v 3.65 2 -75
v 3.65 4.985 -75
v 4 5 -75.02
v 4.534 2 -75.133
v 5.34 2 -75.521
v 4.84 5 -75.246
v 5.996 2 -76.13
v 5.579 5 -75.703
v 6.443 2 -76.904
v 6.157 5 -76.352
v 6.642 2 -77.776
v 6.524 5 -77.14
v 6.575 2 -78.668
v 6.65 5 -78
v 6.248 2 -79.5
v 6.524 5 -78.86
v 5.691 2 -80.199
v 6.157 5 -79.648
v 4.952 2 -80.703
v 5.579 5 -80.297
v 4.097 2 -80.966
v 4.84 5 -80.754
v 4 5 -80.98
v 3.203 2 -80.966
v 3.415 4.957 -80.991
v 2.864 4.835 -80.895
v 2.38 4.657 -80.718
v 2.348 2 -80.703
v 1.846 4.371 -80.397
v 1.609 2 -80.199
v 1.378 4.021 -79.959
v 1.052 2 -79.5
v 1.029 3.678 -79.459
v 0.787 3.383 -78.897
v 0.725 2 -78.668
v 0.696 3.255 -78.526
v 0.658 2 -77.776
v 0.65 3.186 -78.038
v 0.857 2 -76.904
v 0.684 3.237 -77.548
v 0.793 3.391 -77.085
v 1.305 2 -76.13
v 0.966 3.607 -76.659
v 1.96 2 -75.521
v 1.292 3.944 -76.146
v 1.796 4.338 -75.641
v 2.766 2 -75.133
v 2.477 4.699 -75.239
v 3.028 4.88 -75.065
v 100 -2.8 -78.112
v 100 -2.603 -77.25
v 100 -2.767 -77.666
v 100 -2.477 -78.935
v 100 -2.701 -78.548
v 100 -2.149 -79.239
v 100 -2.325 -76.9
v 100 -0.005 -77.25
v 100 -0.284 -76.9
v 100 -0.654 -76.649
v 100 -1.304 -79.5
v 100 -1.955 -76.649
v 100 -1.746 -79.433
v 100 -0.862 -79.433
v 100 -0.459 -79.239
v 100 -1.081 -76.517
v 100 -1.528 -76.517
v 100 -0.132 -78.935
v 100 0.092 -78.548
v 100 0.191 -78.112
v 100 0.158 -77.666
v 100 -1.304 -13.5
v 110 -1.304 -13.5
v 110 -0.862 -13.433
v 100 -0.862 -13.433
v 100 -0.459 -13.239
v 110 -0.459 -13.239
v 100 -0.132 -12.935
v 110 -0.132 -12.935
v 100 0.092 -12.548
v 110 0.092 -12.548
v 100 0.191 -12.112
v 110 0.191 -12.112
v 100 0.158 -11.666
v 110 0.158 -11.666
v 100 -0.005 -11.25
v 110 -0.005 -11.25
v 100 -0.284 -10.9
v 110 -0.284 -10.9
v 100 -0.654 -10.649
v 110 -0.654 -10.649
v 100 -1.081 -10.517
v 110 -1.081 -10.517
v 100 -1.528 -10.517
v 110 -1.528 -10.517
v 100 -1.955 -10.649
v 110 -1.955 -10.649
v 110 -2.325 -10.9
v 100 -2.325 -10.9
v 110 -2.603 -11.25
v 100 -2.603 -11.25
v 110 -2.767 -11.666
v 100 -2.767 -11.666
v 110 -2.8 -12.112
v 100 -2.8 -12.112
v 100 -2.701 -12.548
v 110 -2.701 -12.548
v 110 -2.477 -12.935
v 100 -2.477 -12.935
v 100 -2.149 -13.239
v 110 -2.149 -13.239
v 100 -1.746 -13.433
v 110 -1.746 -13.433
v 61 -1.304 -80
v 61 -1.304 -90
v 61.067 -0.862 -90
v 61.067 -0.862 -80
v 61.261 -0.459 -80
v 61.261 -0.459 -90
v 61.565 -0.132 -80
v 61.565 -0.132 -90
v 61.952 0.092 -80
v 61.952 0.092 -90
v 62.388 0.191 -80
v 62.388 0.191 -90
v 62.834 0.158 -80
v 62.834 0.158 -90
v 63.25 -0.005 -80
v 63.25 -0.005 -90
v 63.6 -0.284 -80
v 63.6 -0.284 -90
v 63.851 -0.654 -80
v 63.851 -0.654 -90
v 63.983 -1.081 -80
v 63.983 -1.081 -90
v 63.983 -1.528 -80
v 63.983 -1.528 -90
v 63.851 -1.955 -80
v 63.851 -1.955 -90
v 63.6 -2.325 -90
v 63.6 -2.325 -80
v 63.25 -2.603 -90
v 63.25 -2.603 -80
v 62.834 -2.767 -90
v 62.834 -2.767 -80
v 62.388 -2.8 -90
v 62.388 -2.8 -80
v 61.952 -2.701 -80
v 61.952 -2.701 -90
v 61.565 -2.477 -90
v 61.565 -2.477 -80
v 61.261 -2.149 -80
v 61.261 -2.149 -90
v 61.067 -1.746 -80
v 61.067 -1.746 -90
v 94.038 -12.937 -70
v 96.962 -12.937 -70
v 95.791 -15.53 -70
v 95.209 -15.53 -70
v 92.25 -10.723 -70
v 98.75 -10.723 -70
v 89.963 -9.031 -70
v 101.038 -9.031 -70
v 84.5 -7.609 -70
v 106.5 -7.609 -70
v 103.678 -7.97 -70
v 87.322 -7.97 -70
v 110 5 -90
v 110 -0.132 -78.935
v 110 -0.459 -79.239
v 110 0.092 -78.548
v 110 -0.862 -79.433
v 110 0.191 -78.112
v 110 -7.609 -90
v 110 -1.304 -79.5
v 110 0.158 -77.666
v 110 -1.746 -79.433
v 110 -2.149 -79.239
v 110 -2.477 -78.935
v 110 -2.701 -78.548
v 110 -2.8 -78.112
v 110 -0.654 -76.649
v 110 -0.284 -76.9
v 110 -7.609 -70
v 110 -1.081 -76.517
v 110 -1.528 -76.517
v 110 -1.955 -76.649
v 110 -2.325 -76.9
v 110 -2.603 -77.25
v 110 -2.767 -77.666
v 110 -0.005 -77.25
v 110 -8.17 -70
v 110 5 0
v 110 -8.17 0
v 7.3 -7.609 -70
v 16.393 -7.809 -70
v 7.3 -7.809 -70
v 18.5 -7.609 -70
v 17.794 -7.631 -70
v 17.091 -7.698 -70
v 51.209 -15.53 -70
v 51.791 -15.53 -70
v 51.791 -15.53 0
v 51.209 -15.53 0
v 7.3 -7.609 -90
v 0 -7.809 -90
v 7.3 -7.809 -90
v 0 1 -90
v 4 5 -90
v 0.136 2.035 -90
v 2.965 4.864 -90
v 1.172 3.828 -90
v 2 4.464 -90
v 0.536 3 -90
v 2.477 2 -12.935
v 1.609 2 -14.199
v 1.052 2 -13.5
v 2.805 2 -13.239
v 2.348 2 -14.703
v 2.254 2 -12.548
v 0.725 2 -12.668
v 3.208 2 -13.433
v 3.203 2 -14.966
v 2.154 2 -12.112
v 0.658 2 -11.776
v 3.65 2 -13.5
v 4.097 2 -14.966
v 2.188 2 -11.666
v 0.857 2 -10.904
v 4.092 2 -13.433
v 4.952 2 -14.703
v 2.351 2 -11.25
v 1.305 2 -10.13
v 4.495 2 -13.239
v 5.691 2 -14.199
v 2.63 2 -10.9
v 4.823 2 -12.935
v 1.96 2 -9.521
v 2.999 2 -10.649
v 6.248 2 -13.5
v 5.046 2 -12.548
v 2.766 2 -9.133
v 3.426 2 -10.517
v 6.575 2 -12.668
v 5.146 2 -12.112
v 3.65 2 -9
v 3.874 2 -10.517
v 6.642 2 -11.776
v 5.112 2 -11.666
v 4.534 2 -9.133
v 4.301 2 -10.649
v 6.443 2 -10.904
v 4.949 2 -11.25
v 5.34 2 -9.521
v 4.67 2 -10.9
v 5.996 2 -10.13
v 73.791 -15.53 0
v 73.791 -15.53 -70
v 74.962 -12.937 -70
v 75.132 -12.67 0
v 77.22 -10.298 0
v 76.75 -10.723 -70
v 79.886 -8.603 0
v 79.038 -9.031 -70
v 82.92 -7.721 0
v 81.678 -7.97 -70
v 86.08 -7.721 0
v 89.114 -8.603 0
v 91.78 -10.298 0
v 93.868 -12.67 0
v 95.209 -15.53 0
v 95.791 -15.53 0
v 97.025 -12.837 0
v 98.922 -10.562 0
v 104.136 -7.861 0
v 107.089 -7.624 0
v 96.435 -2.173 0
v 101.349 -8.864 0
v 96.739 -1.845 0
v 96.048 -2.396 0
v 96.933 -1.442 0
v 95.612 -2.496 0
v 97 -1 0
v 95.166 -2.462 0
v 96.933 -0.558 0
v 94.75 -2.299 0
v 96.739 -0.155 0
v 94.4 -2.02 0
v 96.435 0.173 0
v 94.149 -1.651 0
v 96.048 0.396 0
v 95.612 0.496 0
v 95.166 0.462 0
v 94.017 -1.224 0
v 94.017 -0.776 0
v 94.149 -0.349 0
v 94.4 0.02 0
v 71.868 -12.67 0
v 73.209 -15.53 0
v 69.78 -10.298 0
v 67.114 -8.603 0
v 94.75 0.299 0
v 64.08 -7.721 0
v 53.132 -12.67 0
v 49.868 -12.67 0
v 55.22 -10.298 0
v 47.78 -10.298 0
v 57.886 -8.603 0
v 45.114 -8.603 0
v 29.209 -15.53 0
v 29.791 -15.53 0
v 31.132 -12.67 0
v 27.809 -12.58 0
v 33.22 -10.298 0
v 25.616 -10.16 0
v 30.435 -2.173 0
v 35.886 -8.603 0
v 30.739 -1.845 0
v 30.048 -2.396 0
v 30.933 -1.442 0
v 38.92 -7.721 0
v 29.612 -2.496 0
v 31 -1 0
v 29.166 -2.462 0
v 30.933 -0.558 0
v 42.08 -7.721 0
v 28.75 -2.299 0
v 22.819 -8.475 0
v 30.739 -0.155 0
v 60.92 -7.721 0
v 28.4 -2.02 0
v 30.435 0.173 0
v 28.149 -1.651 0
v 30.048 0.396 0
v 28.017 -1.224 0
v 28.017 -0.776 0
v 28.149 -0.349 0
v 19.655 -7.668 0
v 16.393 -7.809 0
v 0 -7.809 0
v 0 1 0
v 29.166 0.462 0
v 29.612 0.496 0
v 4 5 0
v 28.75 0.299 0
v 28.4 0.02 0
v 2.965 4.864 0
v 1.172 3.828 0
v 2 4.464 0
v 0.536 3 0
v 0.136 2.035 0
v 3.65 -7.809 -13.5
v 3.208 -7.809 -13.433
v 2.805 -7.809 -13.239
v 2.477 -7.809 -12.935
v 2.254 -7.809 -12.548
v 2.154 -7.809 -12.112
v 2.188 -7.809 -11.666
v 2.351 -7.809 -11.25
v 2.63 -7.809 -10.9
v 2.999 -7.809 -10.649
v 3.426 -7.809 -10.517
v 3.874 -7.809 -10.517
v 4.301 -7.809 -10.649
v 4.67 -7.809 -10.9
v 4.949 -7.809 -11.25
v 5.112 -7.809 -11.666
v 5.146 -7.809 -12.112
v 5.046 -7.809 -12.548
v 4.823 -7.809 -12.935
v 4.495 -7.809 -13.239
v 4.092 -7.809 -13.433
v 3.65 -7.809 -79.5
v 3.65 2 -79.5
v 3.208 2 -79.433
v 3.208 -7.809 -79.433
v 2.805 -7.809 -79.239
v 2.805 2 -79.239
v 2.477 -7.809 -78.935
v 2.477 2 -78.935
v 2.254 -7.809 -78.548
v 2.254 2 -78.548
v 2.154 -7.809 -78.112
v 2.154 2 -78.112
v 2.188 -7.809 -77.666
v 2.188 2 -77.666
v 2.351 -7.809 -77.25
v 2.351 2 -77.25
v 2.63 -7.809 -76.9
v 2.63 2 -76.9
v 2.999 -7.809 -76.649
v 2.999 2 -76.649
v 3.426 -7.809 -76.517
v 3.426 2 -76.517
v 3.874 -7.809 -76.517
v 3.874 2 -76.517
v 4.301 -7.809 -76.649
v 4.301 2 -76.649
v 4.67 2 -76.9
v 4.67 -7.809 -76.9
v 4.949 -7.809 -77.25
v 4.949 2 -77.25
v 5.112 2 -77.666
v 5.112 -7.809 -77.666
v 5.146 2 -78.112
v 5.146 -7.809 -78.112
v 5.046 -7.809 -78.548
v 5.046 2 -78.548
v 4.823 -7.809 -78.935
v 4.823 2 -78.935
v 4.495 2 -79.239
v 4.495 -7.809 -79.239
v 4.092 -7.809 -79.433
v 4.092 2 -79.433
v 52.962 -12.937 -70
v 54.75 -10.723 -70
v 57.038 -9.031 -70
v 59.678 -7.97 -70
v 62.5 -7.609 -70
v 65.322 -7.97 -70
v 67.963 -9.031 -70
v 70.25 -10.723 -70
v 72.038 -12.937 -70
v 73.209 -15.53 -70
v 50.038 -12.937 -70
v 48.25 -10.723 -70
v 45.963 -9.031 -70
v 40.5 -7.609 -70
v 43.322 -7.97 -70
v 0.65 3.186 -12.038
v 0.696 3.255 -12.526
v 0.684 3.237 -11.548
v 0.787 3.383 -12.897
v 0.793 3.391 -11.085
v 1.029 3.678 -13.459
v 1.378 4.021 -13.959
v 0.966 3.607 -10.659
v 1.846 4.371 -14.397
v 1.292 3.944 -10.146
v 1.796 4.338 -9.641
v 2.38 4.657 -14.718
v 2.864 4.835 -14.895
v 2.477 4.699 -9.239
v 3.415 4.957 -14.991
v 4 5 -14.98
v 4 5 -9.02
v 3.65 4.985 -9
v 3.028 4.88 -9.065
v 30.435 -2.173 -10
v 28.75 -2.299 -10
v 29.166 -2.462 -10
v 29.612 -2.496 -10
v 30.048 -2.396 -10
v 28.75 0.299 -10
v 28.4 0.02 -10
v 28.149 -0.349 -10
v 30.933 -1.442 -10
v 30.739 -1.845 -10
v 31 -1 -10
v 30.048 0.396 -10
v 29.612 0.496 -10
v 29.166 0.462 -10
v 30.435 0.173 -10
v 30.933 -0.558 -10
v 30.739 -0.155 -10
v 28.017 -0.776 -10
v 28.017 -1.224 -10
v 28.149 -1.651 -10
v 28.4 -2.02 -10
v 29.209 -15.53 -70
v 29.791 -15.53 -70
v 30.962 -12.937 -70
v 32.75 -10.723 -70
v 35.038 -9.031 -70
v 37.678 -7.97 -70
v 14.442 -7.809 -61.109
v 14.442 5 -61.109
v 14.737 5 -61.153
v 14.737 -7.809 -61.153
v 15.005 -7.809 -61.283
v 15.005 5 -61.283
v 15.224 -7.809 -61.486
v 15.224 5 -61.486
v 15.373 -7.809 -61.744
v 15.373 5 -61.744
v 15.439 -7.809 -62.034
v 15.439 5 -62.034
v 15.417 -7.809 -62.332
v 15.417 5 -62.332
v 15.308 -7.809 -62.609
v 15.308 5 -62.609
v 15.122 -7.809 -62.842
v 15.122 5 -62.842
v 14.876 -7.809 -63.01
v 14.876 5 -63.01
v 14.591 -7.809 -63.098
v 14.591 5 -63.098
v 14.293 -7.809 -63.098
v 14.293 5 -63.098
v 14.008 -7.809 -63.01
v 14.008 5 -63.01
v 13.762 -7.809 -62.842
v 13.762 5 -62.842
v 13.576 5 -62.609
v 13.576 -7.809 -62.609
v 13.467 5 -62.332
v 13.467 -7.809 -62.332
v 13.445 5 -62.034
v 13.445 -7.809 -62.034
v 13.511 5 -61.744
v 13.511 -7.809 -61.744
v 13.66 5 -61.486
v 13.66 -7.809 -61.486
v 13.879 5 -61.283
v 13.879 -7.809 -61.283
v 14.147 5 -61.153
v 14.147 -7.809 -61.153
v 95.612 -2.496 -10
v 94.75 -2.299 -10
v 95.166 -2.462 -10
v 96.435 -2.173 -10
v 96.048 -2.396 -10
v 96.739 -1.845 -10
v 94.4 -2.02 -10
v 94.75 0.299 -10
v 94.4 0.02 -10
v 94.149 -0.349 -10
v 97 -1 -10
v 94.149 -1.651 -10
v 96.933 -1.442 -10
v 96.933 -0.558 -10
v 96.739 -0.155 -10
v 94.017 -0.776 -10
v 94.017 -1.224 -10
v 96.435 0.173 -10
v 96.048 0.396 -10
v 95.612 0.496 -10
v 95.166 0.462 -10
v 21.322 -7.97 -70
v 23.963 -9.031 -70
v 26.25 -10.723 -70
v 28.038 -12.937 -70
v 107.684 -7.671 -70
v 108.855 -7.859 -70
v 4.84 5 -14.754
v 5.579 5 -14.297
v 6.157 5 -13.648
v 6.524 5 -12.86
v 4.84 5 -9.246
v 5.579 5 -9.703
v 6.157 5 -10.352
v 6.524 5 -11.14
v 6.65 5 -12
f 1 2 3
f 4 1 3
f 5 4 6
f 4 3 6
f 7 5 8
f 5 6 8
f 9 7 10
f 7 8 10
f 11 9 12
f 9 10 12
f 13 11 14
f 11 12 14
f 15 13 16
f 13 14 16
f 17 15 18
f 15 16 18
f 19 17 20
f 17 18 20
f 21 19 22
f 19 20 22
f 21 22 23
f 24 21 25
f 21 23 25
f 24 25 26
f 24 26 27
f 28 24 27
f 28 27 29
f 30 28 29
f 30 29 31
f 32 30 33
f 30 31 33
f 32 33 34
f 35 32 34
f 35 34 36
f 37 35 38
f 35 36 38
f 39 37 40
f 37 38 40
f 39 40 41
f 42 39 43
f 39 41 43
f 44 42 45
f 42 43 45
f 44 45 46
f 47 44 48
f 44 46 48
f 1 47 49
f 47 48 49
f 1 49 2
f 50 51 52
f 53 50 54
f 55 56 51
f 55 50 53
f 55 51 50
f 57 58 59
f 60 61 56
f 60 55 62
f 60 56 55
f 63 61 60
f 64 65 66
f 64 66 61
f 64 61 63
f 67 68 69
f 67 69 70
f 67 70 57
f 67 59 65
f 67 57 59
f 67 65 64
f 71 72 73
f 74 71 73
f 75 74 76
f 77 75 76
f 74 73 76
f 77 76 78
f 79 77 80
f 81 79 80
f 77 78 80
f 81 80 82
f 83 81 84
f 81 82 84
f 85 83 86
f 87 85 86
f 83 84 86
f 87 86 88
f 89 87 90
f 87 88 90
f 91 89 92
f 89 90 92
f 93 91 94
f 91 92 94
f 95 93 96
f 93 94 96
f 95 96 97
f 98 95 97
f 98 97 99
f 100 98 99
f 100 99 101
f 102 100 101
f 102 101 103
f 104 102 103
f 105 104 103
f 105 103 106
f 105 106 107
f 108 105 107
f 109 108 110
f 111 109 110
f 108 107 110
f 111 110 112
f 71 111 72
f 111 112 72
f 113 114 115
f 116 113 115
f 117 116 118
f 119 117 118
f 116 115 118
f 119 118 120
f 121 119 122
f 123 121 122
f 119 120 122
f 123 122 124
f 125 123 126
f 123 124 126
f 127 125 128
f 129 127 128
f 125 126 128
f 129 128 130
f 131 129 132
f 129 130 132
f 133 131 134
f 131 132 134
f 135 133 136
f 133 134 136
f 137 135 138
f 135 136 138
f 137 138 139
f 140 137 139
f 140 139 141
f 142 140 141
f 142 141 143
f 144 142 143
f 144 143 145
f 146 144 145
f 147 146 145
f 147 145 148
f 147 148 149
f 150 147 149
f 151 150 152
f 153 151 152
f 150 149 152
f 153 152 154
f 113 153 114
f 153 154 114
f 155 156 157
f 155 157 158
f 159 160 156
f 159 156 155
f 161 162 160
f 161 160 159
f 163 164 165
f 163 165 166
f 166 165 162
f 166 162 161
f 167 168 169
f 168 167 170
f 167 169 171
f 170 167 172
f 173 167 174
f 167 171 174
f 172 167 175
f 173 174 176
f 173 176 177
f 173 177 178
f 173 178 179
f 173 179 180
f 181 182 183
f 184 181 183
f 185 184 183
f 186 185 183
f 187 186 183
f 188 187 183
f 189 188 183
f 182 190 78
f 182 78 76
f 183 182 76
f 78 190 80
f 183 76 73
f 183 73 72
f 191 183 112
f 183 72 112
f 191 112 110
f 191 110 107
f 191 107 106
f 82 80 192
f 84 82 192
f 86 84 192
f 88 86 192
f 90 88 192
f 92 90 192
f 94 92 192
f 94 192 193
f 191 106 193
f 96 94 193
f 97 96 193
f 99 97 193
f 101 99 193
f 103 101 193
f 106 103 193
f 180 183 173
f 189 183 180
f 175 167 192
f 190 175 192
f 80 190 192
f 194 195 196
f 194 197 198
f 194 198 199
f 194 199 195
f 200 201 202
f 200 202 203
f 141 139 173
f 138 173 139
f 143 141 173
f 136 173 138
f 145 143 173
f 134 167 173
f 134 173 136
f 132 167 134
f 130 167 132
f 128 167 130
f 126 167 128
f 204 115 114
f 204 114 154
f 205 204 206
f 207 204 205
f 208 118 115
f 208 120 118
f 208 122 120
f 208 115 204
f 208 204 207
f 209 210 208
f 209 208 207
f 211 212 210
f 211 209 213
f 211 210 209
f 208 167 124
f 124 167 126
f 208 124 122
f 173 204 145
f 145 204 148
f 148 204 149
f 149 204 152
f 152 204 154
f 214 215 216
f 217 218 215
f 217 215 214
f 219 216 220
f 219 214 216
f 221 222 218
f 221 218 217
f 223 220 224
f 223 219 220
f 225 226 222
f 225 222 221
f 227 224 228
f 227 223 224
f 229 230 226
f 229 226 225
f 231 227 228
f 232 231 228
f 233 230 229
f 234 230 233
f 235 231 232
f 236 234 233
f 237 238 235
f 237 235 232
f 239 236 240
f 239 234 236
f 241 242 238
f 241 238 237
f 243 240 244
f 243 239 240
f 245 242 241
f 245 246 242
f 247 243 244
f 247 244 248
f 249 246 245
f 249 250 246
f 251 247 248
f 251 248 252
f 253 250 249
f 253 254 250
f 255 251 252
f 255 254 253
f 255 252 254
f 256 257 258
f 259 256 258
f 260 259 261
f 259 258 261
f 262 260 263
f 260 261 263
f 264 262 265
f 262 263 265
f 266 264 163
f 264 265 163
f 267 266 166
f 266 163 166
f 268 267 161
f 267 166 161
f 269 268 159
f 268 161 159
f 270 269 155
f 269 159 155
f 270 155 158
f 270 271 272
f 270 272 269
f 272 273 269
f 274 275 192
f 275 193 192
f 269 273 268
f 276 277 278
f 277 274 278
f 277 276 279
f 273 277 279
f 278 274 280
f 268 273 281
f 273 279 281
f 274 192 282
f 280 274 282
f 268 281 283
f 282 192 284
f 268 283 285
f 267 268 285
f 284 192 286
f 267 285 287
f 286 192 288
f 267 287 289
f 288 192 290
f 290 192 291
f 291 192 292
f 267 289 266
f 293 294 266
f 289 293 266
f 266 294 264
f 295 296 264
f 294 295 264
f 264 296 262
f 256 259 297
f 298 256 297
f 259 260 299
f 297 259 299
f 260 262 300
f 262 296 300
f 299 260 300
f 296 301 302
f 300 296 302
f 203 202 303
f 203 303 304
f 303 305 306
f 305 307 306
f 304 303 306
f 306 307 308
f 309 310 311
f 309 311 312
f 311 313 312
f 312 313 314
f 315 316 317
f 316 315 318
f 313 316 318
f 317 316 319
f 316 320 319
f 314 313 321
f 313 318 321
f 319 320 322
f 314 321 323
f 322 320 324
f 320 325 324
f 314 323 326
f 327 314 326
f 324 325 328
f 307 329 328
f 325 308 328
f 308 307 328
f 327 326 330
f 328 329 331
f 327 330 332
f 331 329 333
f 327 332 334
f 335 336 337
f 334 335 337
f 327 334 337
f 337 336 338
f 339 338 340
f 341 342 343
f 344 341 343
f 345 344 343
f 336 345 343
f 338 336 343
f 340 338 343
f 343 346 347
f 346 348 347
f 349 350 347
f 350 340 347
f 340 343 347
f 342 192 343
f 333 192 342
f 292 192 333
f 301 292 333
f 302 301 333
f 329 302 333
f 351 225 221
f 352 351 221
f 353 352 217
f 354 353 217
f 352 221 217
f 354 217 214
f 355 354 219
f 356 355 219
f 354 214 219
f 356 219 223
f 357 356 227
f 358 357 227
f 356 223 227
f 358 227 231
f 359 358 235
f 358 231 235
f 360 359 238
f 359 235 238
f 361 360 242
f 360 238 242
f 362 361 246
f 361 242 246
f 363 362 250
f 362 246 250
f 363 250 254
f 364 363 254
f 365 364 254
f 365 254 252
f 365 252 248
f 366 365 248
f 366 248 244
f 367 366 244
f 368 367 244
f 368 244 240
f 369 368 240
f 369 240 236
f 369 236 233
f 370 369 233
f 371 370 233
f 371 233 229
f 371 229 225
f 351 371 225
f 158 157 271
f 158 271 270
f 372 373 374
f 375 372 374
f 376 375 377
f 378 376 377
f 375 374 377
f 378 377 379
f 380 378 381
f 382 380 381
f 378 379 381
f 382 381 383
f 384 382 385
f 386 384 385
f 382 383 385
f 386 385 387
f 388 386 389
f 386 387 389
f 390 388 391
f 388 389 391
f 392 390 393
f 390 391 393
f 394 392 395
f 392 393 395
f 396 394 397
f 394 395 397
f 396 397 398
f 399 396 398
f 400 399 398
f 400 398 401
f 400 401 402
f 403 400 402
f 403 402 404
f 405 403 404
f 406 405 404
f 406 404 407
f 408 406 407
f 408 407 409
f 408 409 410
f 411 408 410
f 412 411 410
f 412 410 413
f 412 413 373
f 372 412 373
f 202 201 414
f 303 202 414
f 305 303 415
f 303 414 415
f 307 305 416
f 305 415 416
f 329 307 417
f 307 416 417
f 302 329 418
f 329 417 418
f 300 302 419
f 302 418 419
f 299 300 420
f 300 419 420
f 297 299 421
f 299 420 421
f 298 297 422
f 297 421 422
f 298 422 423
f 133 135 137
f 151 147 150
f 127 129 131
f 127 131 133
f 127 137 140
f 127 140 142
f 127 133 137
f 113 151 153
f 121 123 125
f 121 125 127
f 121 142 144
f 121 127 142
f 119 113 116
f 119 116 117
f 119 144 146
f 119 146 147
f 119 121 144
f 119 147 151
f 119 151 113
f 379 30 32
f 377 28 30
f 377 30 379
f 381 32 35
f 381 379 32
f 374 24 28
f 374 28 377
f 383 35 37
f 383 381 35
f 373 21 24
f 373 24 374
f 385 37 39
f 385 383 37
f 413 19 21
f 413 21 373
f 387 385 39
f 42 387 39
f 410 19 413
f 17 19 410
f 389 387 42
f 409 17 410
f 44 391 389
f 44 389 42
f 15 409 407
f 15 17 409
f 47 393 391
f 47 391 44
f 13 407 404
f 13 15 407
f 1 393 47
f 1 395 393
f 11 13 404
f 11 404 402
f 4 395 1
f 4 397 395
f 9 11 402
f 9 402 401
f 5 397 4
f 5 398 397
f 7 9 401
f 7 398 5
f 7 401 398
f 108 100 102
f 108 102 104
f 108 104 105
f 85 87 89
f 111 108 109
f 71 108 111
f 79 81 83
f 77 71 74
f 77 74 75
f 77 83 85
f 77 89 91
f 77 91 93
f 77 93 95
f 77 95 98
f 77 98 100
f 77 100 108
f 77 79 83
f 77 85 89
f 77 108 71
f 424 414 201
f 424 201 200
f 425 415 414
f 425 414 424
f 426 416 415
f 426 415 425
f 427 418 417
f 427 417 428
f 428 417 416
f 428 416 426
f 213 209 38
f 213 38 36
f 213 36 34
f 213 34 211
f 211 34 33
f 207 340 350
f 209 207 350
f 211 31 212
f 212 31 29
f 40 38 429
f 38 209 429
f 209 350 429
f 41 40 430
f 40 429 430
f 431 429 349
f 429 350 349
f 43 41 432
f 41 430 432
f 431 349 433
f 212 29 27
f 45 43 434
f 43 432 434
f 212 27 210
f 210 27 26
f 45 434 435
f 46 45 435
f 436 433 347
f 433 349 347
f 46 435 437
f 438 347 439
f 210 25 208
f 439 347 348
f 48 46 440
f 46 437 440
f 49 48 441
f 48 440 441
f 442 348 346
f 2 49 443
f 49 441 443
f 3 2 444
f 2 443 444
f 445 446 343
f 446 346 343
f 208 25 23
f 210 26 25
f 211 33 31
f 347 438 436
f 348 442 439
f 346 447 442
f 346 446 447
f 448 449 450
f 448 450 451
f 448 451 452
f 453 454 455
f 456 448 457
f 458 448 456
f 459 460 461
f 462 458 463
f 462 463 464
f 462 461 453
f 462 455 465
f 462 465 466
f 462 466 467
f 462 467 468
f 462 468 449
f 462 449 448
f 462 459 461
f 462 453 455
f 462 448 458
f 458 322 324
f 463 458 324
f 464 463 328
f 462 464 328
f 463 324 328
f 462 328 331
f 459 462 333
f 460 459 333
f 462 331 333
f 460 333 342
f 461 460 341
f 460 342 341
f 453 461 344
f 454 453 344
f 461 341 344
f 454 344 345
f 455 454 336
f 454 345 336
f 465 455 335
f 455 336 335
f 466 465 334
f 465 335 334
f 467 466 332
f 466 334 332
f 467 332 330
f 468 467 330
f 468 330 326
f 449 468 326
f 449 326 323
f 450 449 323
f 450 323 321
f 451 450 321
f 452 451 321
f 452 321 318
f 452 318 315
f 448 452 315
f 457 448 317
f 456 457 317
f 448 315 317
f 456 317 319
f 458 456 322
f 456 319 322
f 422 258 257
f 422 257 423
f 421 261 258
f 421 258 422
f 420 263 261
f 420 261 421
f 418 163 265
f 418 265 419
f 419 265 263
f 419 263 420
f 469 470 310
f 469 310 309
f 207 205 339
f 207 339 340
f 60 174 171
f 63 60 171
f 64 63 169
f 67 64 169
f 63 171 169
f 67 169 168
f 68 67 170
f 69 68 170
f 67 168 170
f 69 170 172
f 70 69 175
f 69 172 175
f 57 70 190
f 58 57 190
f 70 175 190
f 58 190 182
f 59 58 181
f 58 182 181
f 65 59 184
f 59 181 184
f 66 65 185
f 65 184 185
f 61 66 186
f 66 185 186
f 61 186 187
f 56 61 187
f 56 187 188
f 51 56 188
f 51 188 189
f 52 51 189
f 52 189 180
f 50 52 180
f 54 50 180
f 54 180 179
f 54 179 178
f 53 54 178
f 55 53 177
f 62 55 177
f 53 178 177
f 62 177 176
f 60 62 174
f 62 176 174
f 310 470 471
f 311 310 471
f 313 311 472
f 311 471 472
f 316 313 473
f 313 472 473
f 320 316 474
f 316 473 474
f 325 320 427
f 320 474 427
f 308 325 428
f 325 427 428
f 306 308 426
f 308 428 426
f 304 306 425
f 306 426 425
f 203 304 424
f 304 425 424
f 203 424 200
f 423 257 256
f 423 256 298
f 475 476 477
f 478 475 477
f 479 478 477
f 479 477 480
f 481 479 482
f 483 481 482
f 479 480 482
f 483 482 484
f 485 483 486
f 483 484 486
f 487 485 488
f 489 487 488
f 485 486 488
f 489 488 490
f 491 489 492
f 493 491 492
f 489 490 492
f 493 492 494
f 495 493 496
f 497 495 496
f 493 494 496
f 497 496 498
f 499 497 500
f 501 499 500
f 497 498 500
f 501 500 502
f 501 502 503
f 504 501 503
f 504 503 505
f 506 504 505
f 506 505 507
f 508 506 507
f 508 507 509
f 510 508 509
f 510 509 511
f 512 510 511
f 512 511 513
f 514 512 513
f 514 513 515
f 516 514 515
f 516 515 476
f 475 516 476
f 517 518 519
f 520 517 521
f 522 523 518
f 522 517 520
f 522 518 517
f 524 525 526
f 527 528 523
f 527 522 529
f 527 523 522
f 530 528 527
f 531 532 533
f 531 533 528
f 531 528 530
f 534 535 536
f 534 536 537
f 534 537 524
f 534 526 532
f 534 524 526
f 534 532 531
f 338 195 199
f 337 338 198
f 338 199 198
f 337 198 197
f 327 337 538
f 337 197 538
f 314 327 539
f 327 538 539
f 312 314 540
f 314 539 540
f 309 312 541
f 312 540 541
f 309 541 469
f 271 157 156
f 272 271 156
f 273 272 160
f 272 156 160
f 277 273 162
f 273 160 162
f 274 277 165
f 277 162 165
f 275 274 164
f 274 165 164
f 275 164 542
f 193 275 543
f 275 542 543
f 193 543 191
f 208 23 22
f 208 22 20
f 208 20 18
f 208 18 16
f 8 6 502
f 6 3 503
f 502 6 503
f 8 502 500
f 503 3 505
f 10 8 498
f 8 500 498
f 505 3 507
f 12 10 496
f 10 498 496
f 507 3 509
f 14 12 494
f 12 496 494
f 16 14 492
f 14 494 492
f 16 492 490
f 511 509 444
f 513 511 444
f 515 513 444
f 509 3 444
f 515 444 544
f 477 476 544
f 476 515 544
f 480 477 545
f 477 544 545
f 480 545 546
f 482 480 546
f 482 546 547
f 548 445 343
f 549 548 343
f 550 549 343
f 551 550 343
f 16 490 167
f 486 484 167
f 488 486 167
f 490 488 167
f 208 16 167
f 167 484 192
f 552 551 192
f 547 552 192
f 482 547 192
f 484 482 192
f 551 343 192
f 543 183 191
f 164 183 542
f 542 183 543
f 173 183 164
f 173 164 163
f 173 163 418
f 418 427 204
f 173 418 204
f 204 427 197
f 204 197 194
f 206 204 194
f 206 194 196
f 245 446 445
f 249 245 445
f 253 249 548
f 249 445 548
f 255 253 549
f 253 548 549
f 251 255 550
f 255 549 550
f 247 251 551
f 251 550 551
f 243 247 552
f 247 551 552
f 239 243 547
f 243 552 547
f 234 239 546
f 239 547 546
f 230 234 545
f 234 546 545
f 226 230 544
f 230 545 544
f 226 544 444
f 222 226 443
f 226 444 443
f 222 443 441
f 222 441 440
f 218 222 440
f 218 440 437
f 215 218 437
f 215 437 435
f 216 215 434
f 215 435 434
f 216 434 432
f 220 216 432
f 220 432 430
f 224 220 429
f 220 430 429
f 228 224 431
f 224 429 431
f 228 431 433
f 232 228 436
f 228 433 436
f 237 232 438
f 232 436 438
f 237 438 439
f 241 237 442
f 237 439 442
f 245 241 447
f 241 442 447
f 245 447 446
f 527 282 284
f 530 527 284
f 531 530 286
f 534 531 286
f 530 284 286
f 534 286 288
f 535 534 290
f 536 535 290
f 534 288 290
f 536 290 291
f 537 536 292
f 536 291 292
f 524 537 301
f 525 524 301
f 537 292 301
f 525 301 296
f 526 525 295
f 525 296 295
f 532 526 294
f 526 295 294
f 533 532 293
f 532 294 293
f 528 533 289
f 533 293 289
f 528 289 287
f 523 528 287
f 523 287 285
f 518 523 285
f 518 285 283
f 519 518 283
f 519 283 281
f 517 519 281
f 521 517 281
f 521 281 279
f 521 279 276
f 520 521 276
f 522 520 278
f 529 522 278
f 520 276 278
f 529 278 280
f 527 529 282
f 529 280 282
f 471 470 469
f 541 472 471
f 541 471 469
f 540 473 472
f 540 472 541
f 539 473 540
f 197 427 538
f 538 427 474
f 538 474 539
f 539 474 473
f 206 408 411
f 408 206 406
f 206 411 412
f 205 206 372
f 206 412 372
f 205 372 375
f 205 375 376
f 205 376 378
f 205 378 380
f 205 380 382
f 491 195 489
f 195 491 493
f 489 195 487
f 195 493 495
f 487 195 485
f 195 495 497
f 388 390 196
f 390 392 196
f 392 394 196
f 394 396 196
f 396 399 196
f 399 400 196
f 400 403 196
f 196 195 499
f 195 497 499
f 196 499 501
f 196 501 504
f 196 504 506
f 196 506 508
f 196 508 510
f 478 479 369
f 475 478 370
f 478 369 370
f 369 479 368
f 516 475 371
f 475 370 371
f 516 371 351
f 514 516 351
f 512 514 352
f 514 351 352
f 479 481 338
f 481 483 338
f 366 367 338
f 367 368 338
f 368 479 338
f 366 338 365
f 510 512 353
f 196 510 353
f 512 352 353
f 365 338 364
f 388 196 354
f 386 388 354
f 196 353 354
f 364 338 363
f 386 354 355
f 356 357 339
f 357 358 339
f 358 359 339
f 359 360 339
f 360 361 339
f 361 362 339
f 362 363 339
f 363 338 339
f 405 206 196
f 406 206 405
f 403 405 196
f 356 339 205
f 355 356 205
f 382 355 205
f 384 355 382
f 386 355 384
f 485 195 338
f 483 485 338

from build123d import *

# Parameters (mm, degrees)
SKETCH_1_W                      = 110
SKETCH_1_H                      = 70
EXTRUDE_1_DEPTH                 = 5
EXTRUDE_2_DEPTH                 = 70
CUT_EXTRUDE_2_DEPTH             = 70
EXTRUDE_3_DEPTH                 = 20
SKETCH_5_R                      = 1.5
CUT_EXTRUDE_3_DEPTH             = 10
SKETCH_6_R                      = 1.5
CUT_EXTRUDE_4_DEPTH             = 10
CUT_EXTRUDE_5_REACH             = 145.602
SKETCH_7_R                      = 1.5
CUT_EXTRUDE_5_DIRECTION_2_DEPTH = 144.601807274
SKETCH_8_R                      = 3
CUT_EXTRUDE_6_DEPTH             = 3
CUT_EXTRUDE_7_REACH             = 145.602
SKETCH_9_R                      = 1
FILLET_1_R                      = 4
SKETCH_10_R                     = 1.5
CUT_EXTRUDE_8_DEPTH             = 10


with BuildPart() as part:
    # 草图1 → 凸台-拉伸1 (new body)
    with BuildSketch(Plane(origin=(0, 0, 0), x_dir=(1, 0, 0), z_dir=(0, 1, 0))):
        with Locations((55, 35)):
            Rectangle(SKETCH_1_W, SKETCH_1_H)
    extrude(amount=EXTRUDE_1_DEPTH)

    # 草图2 → 凸台-拉伸2 (add)
    with BuildSketch(Plane(origin=(0, 0, -70), x_dir=(-1, 0, 0), z_dir=(0, 0, -1))):
        with BuildLine():
            Line((0, 0), (-110, 0))
            Line((-110, 0), (-110, -8.38034143))
            ThreePointArc((-110, -8.38034143), (-101.497088177, -9.012210946), (-96.000017961, -15.529955003))
            Line((-96.000017961, -15.529955003), (-94.999994392, -15.529955003))
            ThreePointArc((-94.999994392, -15.529955003), (-84.5, -7.808692226), (-74.000005608, -15.529955003))
            Line((-74.000005608, -15.529955003), (-72.999994392, -15.529955003))
            ThreePointArc((-72.999994392, -15.529955003), (-62.5, -7.808692226), (-52.000005608, -15.529955003))
            Line((-52.000005608, -15.529955003), (-50.999994392, -15.529955003))
            ThreePointArc((-50.999994392, -15.529955003), (-40.5, -7.808692226), (-30.000005608, -15.529955003))
            Line((-30.000005608, -15.529955003), (-29.000017961, -15.529955003))
            ThreePointArc((-29.000017961, -15.529955003), (-25.01669227, -9.946792076), (-18.500017961, -7.808674266))
            Line((-18.500017961, -7.808674266), (0, -7.808674266))
            Line((0, -7.808674266), (0, 0))
        make_face()
    extrude(amount=-EXTRUDE_2_DEPTH)

    # 草图3 → 切除-拉伸2 (cut)
    with BuildSketch(Plane(origin=(0, 0, -70), x_dir=(-1, 0, 0), z_dir=(0, 0, -1))):
        with BuildLine():
            Line((-96.000017961, -15.529955003), (-95.790676244, -15.529955003))
            ThreePointArc((-95.790676244, -15.529955003), (-101.348565543, -8.863698751), (-110, -8.169589449))
            Line((-110, -8.169589449), (-110, -8.38034143))
            ThreePointArc((-110, -8.38034143), (-101.497088177, -9.012210946), (-96.000017961, -15.529955003))
        make_face()
        with BuildLine():
            ThreePointArc((-73.790676244, -15.529955003), (-84.500017961, -7.608674266), (-95.209359677, -15.529955003))
            Line((-95.209359677, -15.529955003), (-94.999994392, -15.529955003))
            ThreePointArc((-94.999994392, -15.529955003), (-84.5, -7.808692226), (-74.000005608, -15.529955003))
            Line((-74.000005608, -15.529955003), (-73.790676244, -15.529955003))
        make_face()
        with BuildLine():
            ThreePointArc((-51.790676244, -15.529955003), (-62.500017961, -7.608674266), (-73.209359677, -15.529955003))
            Line((-73.209359677, -15.529955003), (-72.999994392, -15.529955003))
            ThreePointArc((-72.999994392, -15.529955003), (-62.5, -7.808692226), (-52.000005608, -15.529955003))
            Line((-52.000005608, -15.529955003), (-51.790676244, -15.529955003))
        make_face()
        with BuildLine():
            ThreePointArc((-29.790676244, -15.529955003), (-40.500017961, -7.608674266), (-51.209359677, -15.529955003))
            Line((-51.209359677, -15.529955003), (-50.999994392, -15.529955003))
            ThreePointArc((-50.999994392, -15.529955003), (-40.5, -7.808692226), (-30.000005608, -15.529955003))
            Line((-30.000005608, -15.529955003), (-29.790676244, -15.529955003))
        make_face()
        with BuildLine():
            Line((-18.500017961, -7.808674266), (-16.39288721, -7.808674266))
            ThreePointArc((-16.39288721, -7.808674266), (-24.279641861, -9.215137505), (-29.209359677, -15.529955003))
            Line((-29.209359677, -15.529955003), (-29.000017961, -15.529955003))
            ThreePointArc((-29.000017961, -15.529955003), (-25.01669227, -9.946792076), (-18.500017961, -7.808674266))
        make_face()
    extrude(amount=-CUT_EXTRUDE_2_DEPTH, mode=Mode.SUBTRACT)

    # 草图4 → 凸台-拉伸3 (add)
    with BuildSketch(Plane(origin=(0, 0, -70), x_dir=(-1, 0, 0), z_dir=(0, 0, -1))):
        Polygon((0, 5), (-110, 5), (-110, -7.608674266), (-7.3, -7.608674266), (-7.3, -7.808674266), (0, -7.808674266), (0, -7.608674266), align=None)
    extrude(amount=EXTRUDE_3_DEPTH)

    # 草图5 → 切除-拉伸3 (cut)
    with BuildSketch(Plane.XY):
        with Locations((95.50000898, -1)):
            Circle(SKETCH_5_R)
        with Locations((29.49999102, -1)):
            Circle(SKETCH_5_R)
    extrude(amount=-CUT_EXTRUDE_3_DEPTH, mode=Mode.SUBTRACT)

    # 草图6 → 切除-拉伸4 (cut)
    with BuildSketch(Plane(origin=(110, 0, 0), x_dir=(0, 0, -1), z_dir=(1, 0, 0))):
        with Locations((78, -1.304337133)):
            Circle(SKETCH_6_R)
        with Locations((12, -1.304337133)):
            Circle(SKETCH_6_R)
    extrude(amount=-CUT_EXTRUDE_4_DEPTH, mode=Mode.SUBTRACT)

    # 草图7 → 切除-拉伸5 (cut, up to next)
    with BuildSketch(Plane(origin=(0, 5, 0), x_dir=(1, 0, 0), z_dir=(0, 1, 0)), mode=Mode.PRIVATE) as cut_extrude_5_sk1:
        with Locations(Location((3.65000898, 78, 0), (0, 0, 90))):
            Circle(SKETCH_7_R)
    cut_extrude_5_tool1 = extrude(cut_extrude_5_sk1.sketch, amount=-CUT_EXTRUDE_5_REACH, mode=Mode.PRIVATE) & part.part
    # 草图7 → 切除-拉伸5 (cut, up to next)
    with BuildSketch(Plane(origin=(0, 5, 0), x_dir=(1, 0, 0), z_dir=(0, 1, 0)), mode=Mode.PRIVATE) as cut_extrude_5_sk2:
        with Locations(Location((3.65000898, 12, 0), (0, 0, 90))):
            Circle(SKETCH_7_R)
    cut_extrude_5_tool2 = extrude(cut_extrude_5_sk2.sketch, amount=-CUT_EXTRUDE_5_REACH, mode=Mode.PRIVATE) & part.part
    add(cut_extrude_5_tool1.solids().sort_by_distance((3.650009, 5, -78))[0], mode=Mode.SUBTRACT)
    add(cut_extrude_5_tool2.solids().sort_by_distance((3.650009, 5, -12))[0], mode=Mode.SUBTRACT)

    # 草图7 → 切除-拉伸5 direction 2 (cut)
    with BuildSketch(Plane(origin=(0, 5, 0), x_dir=(1, 0, 0), z_dir=(0, 1, 0))):
        with Locations(Location((3.65000898, 78, 0), (0, 0, 90))):
            Circle(SKETCH_7_R)
        with Locations(Location((3.65000898, 12, 0), (0, 0, 90))):
            Circle(SKETCH_7_R)
    extrude(amount=CUT_EXTRUDE_5_DIRECTION_2_DEPTH, mode=Mode.SUBTRACT)

    # 草图8 → 切除-拉伸6 (cut)
    with BuildSketch(Plane(origin=(0, 5, 0), x_dir=(1, 0, 0), z_dir=(0, 1, 0))):
        with Locations(Location((3.65000898, 12, 0), (0, 0, 270))):
            Circle(SKETCH_8_R)
        with Locations(Location((3.65000898, 78, 0), (0, 0, 270))):
            Circle(SKETCH_8_R)
    extrude(amount=-CUT_EXTRUDE_6_DEPTH, mode=Mode.SUBTRACT)

    # 草图9 → 切除-拉伸7 (cut, up to next)
    with BuildSketch(Plane(origin=(0, 5, 0), x_dir=(1, 0, 0), z_dir=(0, 1, 0)), mode=Mode.PRIVATE) as cut_extrude_7_sk1:
        with Locations(Location((14.442, 62.109, 0), (0, 0, 270))):
            Circle(SKETCH_9_R)
    cut_extrude_7_tool1 = extrude(cut_extrude_7_sk1.sketch, amount=-CUT_EXTRUDE_7_REACH, mode=Mode.PRIVATE) & part.part
    add(cut_extrude_7_tool1.solids().sort_by_distance((14.442, 5, -62.109))[0], mode=Mode.SUBTRACT)

    # 圆角1
    # the kernel refuses this fillet: 4 mm, written as the material it takes off along each edge
    with BuildSketch(Plane(origin=(0, 5, 10), x_dir=(0, -1, 0), z_dir=(0, 0, -1))) as fillet_1_piece_1:
        with BuildLine():
            CenterArc((FILLET_1_R, -FILLET_1_R), FILLET_1_R, 90, 90)
            Line((0, -FILLET_1_R), (0, 0))
            Line((0, 0), (FILLET_1_R, 0))
        make_face()
    extrude(amount=110, mode=Mode.SUBTRACT)

    # 草图10 → 切除-拉伸8 (cut)
    with BuildSketch(Plane(origin=(0, 0, -90), x_dir=(-1, 0, 0), z_dir=(0, 0, -1))):
        with Locations((-62.5, -1.304337133)):
            Circle(SKETCH_10_R)
    extrude(amount=-CUT_EXTRUDE_8_DEPTH, mode=Mode.SUBTRACT)


solid = part.part
